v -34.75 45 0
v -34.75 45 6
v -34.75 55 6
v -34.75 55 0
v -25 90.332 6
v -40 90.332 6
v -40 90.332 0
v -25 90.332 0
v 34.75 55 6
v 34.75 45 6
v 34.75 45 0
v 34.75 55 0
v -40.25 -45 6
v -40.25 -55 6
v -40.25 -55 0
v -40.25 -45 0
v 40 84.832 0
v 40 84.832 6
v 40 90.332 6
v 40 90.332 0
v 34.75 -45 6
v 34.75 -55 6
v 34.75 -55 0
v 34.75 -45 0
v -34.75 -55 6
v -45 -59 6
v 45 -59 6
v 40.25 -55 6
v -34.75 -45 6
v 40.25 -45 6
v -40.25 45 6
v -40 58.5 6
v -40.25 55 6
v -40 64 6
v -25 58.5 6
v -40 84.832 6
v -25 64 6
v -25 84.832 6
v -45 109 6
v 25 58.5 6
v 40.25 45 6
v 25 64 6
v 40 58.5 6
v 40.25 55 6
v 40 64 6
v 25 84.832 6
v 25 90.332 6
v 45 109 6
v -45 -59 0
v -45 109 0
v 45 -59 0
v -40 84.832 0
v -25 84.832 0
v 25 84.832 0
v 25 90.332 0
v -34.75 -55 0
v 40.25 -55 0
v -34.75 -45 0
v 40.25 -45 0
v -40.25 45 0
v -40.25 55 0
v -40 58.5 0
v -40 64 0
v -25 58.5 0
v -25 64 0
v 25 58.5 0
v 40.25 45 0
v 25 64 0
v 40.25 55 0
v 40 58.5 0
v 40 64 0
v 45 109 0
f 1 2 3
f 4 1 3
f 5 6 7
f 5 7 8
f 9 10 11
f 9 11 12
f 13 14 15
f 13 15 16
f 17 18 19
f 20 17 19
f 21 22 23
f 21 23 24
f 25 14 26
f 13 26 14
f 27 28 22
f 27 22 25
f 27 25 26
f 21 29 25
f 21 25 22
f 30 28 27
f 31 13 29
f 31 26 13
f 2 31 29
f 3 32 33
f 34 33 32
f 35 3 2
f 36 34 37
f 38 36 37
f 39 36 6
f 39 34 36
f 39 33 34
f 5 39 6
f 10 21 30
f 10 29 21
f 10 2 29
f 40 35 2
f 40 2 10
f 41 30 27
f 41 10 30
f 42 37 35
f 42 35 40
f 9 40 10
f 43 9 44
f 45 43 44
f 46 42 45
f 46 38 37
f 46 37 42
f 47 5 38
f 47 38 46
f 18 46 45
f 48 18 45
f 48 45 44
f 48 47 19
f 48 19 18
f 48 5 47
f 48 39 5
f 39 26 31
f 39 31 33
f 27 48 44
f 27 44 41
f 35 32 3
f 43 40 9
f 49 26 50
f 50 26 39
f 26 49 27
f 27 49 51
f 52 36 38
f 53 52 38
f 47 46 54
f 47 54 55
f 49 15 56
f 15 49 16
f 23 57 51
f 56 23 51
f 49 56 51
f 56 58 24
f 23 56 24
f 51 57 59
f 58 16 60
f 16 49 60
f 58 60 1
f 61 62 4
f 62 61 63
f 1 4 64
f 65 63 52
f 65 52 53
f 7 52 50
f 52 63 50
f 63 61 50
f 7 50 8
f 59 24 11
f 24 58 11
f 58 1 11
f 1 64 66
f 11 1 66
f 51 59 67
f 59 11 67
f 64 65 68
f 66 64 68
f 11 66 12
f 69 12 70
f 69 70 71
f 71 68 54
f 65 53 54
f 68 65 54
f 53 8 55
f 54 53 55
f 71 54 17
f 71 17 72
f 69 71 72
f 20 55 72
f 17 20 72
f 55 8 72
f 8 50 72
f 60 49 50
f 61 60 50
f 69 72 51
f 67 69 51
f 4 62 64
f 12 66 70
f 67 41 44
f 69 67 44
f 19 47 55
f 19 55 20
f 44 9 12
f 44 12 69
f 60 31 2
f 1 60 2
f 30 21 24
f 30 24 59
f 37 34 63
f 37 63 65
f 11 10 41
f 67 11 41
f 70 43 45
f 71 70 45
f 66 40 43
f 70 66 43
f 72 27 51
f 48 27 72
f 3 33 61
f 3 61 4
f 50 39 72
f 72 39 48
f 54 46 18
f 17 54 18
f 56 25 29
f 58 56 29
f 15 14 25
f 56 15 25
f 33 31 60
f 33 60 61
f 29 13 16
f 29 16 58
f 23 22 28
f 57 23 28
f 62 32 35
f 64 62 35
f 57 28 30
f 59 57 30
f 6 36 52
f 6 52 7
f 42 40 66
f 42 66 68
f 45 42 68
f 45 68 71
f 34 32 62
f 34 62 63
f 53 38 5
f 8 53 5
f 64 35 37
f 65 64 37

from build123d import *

# Parameters (mm, degrees)
F0_W     = 90
F0_H     = 118
F1_DEPTH = 6
F2_W     = 90
F2_H     = 50
F3_DEPTH = 6
F4_W     = 5.5
F4_H     = 10
F5_DEPTH = 6
F6_W     = 15
F6_H     = 5.5
F7_DEPTH = 6


with BuildPart() as f1:
    # F0 (on Top) → F1 (new body)
    with BuildSketch(Plane.XY):
        Rectangle(F0_W, F0_H)
    extrude(amount=F1_DEPTH)

    # F2 (on face) → F3 (join)
    with BuildSketch(Plane.XY.offset(6)):
        with Locations((0, 84)):
            Rectangle(F2_W, F2_H)
    extrude(amount=-F3_DEPTH)

    # F4 (on face) → F5 (cut)
    with BuildSketch(Plane.XY.offset(6)):
        with Locations((-37.5, 50)):
            Rectangle(F4_W, F4_H)
        with Locations((37.5, 50)):
            Rectangle(F4_W, F4_H)
        with Locations((37.5, -50)):
            Rectangle(F4_W, F4_H)
        with Locations((-37.5, -50)):
            Rectangle(F4_W, F4_H)
    extrude(amount=-F5_DEPTH, mode=Mode.SUBTRACT)

    # F6 (on face) → F7 (cut)
    with BuildSketch(Plane.XY.offset(6)):
        with Locations((-32.5, 61.25)):
            Rectangle(F6_W, F6_H)
        with Locations((32.5, 61.25)):
            Rectangle(F6_W, F6_H)
        with Locations((-32.5, 87.582247)):
            Rectangle(F6_W, F6_H)
        with Locations((32.5, 87.582247)):
            Rectangle(F6_W, F6_H)
    extrude(amount=-F7_DEPTH, mode=Mode.SUBTRACT)


solid = f1.part
